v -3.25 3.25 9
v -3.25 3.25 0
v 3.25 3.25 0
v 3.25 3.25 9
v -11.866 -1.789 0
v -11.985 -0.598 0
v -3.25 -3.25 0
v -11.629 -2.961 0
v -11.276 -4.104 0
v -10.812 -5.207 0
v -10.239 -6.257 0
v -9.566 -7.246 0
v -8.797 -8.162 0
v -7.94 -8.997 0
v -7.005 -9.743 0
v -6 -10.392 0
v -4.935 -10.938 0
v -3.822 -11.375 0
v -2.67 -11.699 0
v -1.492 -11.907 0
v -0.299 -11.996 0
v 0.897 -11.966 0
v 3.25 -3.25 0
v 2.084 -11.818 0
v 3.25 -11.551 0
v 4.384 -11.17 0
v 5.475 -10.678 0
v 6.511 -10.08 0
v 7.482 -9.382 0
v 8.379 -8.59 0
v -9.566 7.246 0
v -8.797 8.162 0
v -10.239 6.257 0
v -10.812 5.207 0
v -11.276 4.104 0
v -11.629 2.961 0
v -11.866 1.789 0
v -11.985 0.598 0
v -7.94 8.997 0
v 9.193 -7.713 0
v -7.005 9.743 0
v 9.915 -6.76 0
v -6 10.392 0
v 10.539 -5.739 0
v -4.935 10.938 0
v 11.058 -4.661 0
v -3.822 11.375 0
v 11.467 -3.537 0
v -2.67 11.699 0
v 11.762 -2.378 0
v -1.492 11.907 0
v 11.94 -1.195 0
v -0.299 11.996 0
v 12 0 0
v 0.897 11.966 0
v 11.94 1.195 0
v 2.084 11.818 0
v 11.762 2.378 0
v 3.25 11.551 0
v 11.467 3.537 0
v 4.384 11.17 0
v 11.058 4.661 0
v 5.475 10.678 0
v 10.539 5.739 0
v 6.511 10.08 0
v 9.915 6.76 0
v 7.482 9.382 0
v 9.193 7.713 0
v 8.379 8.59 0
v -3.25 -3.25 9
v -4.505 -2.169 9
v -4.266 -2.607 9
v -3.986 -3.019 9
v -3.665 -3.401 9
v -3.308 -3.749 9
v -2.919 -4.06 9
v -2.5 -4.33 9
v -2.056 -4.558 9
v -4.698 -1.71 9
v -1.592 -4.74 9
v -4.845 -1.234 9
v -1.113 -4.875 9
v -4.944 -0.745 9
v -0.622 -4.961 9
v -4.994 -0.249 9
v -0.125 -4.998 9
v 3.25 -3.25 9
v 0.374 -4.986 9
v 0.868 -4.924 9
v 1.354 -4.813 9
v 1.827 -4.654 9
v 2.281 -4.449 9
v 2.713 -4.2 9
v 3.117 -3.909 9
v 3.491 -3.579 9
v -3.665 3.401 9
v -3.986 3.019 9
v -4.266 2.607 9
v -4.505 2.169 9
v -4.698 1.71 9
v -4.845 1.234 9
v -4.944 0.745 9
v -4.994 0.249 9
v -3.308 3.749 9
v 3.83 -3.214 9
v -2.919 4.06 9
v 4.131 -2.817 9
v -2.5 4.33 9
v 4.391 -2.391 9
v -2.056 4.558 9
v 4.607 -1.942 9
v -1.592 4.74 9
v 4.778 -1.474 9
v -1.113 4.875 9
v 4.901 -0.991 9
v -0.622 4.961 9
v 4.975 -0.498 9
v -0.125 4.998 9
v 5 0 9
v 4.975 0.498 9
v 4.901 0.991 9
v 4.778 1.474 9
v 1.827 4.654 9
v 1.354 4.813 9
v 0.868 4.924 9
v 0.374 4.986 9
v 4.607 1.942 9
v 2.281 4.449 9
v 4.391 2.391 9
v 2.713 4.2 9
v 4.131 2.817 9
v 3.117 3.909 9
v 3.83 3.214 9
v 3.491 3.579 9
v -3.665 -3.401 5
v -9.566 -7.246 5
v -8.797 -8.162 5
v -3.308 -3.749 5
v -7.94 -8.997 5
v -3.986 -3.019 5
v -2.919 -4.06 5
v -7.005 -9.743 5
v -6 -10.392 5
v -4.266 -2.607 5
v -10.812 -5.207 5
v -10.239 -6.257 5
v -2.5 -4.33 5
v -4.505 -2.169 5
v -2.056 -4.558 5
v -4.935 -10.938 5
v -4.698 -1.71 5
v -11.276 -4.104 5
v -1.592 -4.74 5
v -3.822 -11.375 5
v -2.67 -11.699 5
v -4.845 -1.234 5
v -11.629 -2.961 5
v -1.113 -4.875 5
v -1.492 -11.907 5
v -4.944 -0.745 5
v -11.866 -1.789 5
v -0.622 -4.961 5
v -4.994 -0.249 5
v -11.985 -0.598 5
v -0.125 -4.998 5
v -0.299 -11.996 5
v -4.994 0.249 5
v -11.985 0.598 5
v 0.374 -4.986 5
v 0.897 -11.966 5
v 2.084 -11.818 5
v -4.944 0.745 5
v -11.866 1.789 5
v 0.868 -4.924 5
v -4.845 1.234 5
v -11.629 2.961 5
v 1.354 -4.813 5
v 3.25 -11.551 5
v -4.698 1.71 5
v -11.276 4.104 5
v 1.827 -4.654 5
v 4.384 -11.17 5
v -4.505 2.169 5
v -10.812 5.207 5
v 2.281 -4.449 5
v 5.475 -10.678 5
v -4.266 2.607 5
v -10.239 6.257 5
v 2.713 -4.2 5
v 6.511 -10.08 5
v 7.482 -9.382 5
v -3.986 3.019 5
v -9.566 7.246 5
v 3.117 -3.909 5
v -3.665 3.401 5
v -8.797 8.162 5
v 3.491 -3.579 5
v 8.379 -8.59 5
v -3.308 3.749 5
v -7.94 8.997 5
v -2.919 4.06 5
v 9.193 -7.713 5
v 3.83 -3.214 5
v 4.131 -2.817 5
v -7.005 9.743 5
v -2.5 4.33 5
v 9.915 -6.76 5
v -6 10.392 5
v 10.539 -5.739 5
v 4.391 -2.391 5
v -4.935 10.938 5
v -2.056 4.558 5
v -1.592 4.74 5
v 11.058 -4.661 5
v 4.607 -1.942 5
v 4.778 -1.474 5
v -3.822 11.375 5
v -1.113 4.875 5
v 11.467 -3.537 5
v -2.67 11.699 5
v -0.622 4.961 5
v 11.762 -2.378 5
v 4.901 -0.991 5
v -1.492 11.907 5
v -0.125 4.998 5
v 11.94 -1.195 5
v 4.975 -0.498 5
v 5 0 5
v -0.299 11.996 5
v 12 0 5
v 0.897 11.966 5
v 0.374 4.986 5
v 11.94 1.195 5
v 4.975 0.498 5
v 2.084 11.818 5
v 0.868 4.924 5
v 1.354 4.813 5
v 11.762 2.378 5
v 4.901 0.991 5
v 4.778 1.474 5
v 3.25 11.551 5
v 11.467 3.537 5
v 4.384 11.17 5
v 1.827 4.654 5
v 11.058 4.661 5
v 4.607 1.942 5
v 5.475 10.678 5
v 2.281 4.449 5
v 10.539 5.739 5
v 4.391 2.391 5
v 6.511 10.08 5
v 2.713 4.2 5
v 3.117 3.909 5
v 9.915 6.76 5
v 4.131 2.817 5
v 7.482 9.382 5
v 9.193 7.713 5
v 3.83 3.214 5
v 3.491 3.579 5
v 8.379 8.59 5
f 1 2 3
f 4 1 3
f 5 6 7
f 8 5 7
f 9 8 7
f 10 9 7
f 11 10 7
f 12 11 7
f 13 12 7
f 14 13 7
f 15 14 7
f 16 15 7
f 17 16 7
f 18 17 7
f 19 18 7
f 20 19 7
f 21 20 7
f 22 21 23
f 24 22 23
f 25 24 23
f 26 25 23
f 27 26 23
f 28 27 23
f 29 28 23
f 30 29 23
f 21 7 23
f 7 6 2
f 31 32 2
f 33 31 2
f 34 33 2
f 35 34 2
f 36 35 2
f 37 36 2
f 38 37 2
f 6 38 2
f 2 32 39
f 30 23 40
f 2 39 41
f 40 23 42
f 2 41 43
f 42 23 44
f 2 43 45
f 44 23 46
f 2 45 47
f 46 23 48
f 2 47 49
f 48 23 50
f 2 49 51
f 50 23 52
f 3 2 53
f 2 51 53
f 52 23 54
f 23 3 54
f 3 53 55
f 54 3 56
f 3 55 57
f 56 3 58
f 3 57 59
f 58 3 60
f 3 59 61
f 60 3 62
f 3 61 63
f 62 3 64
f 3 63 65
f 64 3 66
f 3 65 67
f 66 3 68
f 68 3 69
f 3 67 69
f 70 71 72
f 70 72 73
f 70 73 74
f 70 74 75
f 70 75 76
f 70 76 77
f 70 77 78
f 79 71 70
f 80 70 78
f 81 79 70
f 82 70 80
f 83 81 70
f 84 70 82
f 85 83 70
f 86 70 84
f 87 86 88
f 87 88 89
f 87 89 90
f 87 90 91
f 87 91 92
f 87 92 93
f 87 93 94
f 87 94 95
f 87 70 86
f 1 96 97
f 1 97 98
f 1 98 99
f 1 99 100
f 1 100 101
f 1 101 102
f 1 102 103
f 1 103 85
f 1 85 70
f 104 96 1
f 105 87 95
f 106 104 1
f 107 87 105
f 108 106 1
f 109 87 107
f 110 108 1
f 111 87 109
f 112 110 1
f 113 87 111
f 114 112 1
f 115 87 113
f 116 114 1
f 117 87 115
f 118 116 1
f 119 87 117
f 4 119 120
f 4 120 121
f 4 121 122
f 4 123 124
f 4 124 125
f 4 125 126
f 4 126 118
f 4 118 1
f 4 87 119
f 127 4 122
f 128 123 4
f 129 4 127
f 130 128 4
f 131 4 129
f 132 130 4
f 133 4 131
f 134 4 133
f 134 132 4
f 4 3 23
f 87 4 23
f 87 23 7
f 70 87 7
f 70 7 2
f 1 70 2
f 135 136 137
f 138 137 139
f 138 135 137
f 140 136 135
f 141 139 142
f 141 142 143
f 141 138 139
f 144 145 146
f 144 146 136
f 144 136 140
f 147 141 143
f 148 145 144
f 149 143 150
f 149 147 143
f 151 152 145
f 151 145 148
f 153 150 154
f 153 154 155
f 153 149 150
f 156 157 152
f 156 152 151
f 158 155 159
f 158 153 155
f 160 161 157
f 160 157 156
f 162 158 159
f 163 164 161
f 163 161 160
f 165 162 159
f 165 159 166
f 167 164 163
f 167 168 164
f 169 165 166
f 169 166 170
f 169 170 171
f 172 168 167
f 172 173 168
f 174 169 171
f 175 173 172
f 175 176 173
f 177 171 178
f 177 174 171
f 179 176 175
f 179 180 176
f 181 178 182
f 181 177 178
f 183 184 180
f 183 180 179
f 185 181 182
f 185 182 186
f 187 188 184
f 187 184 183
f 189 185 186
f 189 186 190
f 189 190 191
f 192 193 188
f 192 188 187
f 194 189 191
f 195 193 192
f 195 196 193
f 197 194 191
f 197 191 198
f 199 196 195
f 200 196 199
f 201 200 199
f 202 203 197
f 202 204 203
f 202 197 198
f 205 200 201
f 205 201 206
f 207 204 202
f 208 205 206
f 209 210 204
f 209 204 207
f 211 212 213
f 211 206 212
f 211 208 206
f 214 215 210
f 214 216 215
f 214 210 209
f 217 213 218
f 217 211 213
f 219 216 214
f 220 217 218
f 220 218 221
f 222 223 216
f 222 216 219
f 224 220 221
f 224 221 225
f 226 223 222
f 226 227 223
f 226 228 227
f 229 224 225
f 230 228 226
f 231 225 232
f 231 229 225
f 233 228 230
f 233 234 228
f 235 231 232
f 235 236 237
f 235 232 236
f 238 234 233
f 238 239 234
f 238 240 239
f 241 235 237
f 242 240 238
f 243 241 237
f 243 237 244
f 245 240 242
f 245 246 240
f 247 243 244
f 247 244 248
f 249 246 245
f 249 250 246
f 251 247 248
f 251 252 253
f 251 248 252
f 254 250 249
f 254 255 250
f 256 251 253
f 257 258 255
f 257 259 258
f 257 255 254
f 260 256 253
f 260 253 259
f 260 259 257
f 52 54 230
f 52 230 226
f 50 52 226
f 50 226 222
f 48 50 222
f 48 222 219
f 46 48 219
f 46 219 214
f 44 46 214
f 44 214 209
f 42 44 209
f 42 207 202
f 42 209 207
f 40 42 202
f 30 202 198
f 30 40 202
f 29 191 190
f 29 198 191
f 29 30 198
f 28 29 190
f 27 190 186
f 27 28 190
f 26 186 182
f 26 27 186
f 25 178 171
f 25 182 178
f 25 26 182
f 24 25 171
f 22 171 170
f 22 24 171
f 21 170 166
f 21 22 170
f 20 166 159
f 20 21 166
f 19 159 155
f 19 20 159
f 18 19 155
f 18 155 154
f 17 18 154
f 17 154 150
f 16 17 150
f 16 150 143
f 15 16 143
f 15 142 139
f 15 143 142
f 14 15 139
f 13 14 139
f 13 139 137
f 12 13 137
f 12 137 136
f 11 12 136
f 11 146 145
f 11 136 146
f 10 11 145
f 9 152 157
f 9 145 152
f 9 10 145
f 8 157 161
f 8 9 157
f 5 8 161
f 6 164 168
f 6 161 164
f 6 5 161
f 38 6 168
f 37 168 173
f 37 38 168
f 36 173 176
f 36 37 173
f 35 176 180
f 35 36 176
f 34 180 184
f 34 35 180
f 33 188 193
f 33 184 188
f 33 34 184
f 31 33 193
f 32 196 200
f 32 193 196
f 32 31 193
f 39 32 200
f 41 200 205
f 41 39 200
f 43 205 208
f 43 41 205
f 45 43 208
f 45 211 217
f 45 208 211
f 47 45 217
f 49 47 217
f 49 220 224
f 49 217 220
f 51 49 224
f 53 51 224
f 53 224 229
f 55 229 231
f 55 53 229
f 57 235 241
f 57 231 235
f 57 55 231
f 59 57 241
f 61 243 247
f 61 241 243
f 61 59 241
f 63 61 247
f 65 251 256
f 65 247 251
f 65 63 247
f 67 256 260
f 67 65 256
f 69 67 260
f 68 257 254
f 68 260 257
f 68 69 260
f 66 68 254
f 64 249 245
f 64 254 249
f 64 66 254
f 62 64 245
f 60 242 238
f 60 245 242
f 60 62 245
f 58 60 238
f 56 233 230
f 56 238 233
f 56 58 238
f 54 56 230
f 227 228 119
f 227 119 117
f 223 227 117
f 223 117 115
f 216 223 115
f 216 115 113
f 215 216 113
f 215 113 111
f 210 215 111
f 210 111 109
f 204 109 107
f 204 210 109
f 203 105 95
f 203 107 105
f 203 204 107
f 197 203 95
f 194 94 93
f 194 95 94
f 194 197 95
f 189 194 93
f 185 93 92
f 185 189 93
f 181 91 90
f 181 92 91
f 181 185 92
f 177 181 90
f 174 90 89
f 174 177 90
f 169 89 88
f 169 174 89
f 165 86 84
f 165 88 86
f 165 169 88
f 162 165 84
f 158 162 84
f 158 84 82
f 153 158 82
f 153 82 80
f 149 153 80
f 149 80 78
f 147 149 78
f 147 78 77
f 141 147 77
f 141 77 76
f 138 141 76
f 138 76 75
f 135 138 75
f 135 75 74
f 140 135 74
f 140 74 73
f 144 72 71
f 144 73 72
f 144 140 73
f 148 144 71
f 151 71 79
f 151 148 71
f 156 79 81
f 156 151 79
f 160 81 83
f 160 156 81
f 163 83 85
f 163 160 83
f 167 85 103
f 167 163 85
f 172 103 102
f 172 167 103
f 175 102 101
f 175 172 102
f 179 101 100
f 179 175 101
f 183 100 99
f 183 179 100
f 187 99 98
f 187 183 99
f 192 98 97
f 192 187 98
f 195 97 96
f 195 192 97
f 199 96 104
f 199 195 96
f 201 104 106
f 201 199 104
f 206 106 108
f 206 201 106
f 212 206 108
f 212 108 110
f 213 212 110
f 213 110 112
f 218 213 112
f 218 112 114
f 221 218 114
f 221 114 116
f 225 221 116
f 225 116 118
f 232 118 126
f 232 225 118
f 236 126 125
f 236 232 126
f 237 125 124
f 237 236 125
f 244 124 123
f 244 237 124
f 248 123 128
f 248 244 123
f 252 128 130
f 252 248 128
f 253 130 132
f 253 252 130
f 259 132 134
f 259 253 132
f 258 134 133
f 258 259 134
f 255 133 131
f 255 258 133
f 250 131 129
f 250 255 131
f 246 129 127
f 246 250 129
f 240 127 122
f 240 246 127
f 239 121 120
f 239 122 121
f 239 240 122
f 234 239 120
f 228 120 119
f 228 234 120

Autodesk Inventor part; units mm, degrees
ref_plane "YZ Plane" through (0, 0, 0) normal (1, 0, 0) x (0, 1, 0)
ref_plane "XZ Plane" through (0, 0, 0) normal (0, 1, 0) x (-1, 0, 0)
ref_plane "XY Plane" through (0, 0, 0) normal (0, 0, 1) x (1, 0, 0)
sketch "Sketch1" plane through (0, 0, 0) normal (0, 0, 1) x (1, 0, 0)
  circle A0 centre (0, 0) radius 12
  line L0 (-3.25, 3.25) -> (3.25, 3.25)
  line L1 (3.25, 3.25) -> (3.25, -3.25)
  line L2 (3.25, -3.25) -> (-3.25, -3.25)
  line L3 (-3.25, -3.25) -> (-3.25, 3.25)
  dimension "d0" = 24
  dimension "d1" = 6.5
extrude "Extrusion1" add sketch "Sketch1" along normal blind 5
sketch "Sketch2" plane through (0, 0, 5) normal (0, 0, 1) x (1, 0, 0)
  circle A0 centre (0, 0) radius 5
  line L0 (-3.25, 3.25) -> (3.25, 3.25) projected
  line L1 (3.25, 3.25) -> (3.25, -3.25)
  line L2 (3.25, -3.25) -> (-3.25, -3.25)
  line L3 (-3.25, -3.25) -> (-3.25, 3.25)
  line L4 (-3.25, 3.25) -> (3.25, 3.25)
  point P0 (0, 3.25)
extrude "Extrusion2" add sketch "Sketch2" along normal blind 4
properties part number "secondwheel"
